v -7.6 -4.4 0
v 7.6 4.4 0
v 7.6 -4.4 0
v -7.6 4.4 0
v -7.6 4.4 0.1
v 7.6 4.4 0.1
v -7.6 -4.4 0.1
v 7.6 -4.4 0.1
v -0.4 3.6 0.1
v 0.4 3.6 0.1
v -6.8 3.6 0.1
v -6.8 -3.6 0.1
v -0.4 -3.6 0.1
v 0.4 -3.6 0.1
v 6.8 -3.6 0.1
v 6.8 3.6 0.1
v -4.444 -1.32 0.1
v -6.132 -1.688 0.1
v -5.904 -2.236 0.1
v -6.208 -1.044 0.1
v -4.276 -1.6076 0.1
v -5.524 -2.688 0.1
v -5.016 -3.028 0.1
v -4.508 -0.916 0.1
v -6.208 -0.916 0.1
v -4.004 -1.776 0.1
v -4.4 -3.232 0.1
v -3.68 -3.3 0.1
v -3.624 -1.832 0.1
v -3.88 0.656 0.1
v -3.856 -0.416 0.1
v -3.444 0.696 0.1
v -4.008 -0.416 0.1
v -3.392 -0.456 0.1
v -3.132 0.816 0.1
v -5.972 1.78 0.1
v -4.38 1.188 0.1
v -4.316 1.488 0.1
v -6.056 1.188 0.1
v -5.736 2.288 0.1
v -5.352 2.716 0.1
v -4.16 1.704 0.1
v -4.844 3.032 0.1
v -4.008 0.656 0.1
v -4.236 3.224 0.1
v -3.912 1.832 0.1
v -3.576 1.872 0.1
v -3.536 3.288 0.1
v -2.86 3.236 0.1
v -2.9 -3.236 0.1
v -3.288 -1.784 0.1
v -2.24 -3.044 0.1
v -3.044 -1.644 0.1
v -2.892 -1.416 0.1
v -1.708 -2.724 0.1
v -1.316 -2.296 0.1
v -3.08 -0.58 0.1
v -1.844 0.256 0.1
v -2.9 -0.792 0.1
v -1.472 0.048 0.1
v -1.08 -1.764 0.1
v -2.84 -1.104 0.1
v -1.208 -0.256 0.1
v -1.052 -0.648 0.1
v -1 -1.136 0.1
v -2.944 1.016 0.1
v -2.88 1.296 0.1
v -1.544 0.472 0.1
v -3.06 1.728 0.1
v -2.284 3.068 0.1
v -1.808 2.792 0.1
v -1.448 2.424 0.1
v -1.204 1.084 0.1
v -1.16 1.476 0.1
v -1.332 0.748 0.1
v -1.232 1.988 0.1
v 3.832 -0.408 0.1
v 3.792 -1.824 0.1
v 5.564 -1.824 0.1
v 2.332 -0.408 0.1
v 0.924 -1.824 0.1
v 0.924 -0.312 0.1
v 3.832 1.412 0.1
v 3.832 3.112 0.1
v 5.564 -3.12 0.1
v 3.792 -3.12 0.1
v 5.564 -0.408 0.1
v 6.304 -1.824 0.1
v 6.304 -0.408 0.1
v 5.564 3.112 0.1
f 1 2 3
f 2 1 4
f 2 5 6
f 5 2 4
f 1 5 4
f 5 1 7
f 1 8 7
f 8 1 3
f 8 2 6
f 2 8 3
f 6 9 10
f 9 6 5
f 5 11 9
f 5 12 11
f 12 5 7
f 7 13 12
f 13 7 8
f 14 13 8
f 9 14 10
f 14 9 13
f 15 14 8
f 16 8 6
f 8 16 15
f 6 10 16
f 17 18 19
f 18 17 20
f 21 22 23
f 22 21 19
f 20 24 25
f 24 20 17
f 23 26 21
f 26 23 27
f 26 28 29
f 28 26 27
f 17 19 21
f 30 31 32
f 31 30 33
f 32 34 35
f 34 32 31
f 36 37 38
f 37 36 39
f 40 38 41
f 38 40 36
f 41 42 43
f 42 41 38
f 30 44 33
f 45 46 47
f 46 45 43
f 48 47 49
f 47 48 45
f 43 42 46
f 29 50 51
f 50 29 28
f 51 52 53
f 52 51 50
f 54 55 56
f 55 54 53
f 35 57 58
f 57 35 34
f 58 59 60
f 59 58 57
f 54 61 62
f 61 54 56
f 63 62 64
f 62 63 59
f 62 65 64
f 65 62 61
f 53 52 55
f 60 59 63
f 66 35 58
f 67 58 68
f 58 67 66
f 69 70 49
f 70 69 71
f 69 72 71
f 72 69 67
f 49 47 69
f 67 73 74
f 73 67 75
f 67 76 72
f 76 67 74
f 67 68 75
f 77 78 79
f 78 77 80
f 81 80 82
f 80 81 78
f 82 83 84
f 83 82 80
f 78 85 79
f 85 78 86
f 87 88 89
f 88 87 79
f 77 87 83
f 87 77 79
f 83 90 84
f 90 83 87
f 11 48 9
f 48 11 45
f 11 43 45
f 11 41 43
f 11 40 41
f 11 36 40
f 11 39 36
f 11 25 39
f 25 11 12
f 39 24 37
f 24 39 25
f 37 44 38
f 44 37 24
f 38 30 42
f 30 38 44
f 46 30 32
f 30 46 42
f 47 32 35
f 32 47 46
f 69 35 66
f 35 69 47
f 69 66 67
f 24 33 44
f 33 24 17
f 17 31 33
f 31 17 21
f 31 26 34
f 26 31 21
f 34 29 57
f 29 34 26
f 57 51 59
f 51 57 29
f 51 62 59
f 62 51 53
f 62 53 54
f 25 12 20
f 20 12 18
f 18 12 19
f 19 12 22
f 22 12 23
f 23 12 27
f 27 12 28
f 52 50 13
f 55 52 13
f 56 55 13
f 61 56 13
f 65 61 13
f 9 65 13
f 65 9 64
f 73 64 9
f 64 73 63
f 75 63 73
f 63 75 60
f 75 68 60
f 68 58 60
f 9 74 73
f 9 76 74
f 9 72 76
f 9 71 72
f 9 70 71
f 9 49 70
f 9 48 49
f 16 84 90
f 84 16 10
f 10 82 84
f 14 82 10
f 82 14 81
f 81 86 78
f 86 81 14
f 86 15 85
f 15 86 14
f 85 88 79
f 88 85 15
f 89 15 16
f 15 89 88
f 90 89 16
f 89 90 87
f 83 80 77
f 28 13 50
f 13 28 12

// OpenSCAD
// file: ../p/box5-12.scad
use <../lib.scad>
function ldraw_lib__box5_12() = [
// 0 Box with 5 Faces without Any Edges
// 0 Name: box5-12.dat
// 0 Author: Chris Dee [cwdee]
// 0 !LDRAW_ORG Primitive UPDATE 2009-02
// 0 !LICENSE Licensed under CC BY 2.0 and CC BY 4.0 : see CAreadme.txt
// 
// 0 BFC CERTIFY CCW
  [0,"BFC","CERTIFY"],
  [0,"BFC","CCW"],
// 
// 0 !HISTORY 2009-09-03 [PTadmin] Official Update 2009-02
// 
// 
// 4 16 1 1 1 1 1 -1 -1 1 -1 -1 1 1
  [4,16,1,1,1,1,1,-1,-1,1,-1,-1,1,1],
// 4 16 -1 0 1 1 0 1 1 1 1 -1 1 1
  [4,16,-1,0,1,1,0,1,1,1,1,-1,1,1],
// 4 16 -1 0 -1 -1 0 1 -1 1 1 -1 1 -1
  [4,16,-1,0,-1,-1,0,1,-1,1,1,-1,1,-1],
// 4 16 1 0 -1 -1 0 -1 -1 1 -1 1 1 -1
  [4,16,1,0,-1,-1,0,-1,-1,1,-1,1,1,-1],
// 4 16 1 0 1 1 0 -1 1 1 -1 1 1 1
  [4,16,1,0,1,1,0,-1,1,1,-1,1,1,1],
// 0
];
module ldraw_lib__box5_12(step=0, col=false, unit=2/5, alt=false, line=0.2, solid=!$preview)
    makepoly(ldraw_lib__box5_12(), step=step, col=col, unit=unit, alt=alt, line=line, solid=solid);
ldraw_lib__box5_12(line=0.2);
// main file
use <../lib.scad>
use <../p/box5-12.scad>
function ldraw_lib__190155d() = [
// 0 Sticker  1.1 x  1.9 with White "3" and "4" in Black Squares
// 0 Name: 190155d.dat
// 0 Author: Takeshi Takahashi [RainbowDolphin]
// 0 !LDRAW_ORG Part UPDATE 2022-05
// 0 !LICENSE Licensed under CC BY 2.0 and CC BY 4.0 : see CAreadme.txt
// 
// 0 BFC CERTIFY CCW
  [0,"BFC","CERTIFY"],
  [0,"BFC","CCW"],
// 
// 0 !KEYWORDS Service station, Set 6378
// 
// 0 !HISTORY 2022-09-15 [PTadmin] Official Update 2022-05
// 
// 
// 1 16 0 -0.25 0 19 0 0 0 0.25 0 0 0 11 box5-12.dat
  [1,16,0,-0.25,0,19,0,0,0,0.25,0,0,0,11, ldraw_lib__box5_12()],
// 4 15 1 -0.25 9 19 -0.25 11 -19 -0.25 11 -1 -0.25 9
  [4,15,1,-0.25,9,19,-0.25,11,-19,-0.25,11,-1,-0.25,9],
// 3 15 -19 -0.25 11 -17 -0.25 9 -1 -0.25 9
  [3,15,-19,-0.25,11,-17,-0.25,9,-1,-0.25,9],
// 4 15 -17 -0.25 -9 -17 -0.25 9 -19 -0.25 11 -19 -0.25 -11
  [4,15,-17,-0.25,-9,-17,-0.25,9,-19,-0.25,11,-19,-0.25,-11],
// 4 15 -1 -0.25 -9 -17 -0.25 -9 -19 -0.25 -11 19 -0.25 -11
  [4,15,-1,-0.25,-9,-17,-0.25,-9,-19,-0.25,-11,19,-0.25,-11],
// 3 15 1 -0.25 -9 -1 -0.25 -9 19 -0.25 -11
  [3,15,1,-0.25,-9,-1,-0.25,-9,19,-0.25,-11],
// 4 15 -1 -0.25 -9 1 -0.25 -9 1 -0.25 9 -1 -0.25 9
  [4,15,-1,-0.25,-9,1,-0.25,-9,1,-0.25,9,-1,-0.25,9],
// 3 15 17 -0.25 -9 1 -0.25 -9 19 -0.25 -11
  [3,15,17,-0.25,-9,1,-0.25,-9,19,-0.25,-11],
// 4 15 17 -0.25 9 17 -0.25 -9 19 -0.25 -11 19 -0.25 11
  [4,15,17,-0.25,9,17,-0.25,-9,19,-0.25,-11,19,-0.25,11],
// 3 15 19 -0.25 11 1 -0.25 9 17 -0.25 9
  [3,15,19,-0.25,11,1,-0.25,9,17,-0.25,9],
// 4 15 -15.33 -0.25 -4.22 -14.76 -0.25 -5.59 -11.11 -0.25 -3.3 -15.52 -0.25 -2.61
  [4,15,-15.33,-0.25,-4.22,-14.76,-0.25,-5.59,-11.11,-0.25,-3.3,-15.52,-0.25,-2.61],
// 4 15 -10.69 -0.25 -4.019 -14.76 -0.25 -5.59 -13.81 -0.25 -6.72 -12.54 -0.25 -7.57
  [4,15,-10.69,-0.25,-4.019,-14.76,-0.25,-5.59,-13.81,-0.25,-6.72,-12.54,-0.25,-7.57],
// 4 15 -11.27 -0.25 -2.29 -15.52 -0.25 -2.29 -15.52 -0.25 -2.61 -11.11 -0.25 -3.3
  [4,15,-11.27,-0.25,-2.29,-15.52,-0.25,-2.29,-15.52,-0.25,-2.61,-11.11,-0.25,-3.3],
// 4 15 -10.01 -0.25 -4.44 -10.69 -0.25 -4.019 -12.54 -0.25 -7.57 -11 -0.25 -8.08
  [4,15,-10.01,-0.25,-4.44,-10.69,-0.25,-4.019,-12.54,-0.25,-7.57,-11,-0.25,-8.08],
// 4 15 -10.01 -0.25 -4.44 -11 -0.25 -8.08 -9.2 -0.25 -8.25 -9.06 -0.25 -4.58
  [4,15,-10.01,-0.25,-4.44,-11,-0.25,-8.08,-9.2,-0.25,-8.25,-9.06,-0.25,-4.58],
// 3 15 -11.11 -0.25 -3.3 -14.76 -0.25 -5.59 -10.69 -0.25 -4.019
  [3,15,-11.11,-0.25,-3.3,-14.76,-0.25,-5.59,-10.69,-0.25,-4.019],
// 4 15 -9.7 -0.25 1.64 -10.02 -0.25 -1.04 -9.64 -0.25 -1.04 -8.61 -0.25 1.74
  [4,15,-9.7,-0.25,1.64,-10.02,-0.25,-1.04,-9.64,-0.25,-1.04,-8.61,-0.25,1.74],
// 4 15 -8.61 -0.25 1.74 -9.64 -0.25 -1.04 -8.48 -0.25 -1.14 -7.83 -0.25 2.04
  [4,15,-8.61,-0.25,1.74,-9.64,-0.25,-1.04,-8.48,-0.25,-1.14,-7.83,-0.25,2.04],
// 4 15 -14.93 -0.25 4.45 -15.14 -0.25 2.97 -10.95 -0.25 2.97 -10.79 -0.25 3.72
  [4,15,-14.93,-0.25,4.45,-15.14,-0.25,2.97,-10.95,-0.25,2.97,-10.79,-0.25,3.72],
// 4 15 -14.34 -0.25 5.72 -14.93 -0.25 4.45 -10.79 -0.25 3.72 -13.38 -0.25 6.79
  [4,15,-14.34,-0.25,5.72,-14.93,-0.25,4.45,-10.79,-0.25,3.72,-13.38,-0.25,6.79],
// 4 15 -10.4 -0.25 4.26 -12.11 -0.25 7.58 -13.38 -0.25 6.79 -10.79 -0.25 3.72
  [4,15,-10.4,-0.25,4.26,-12.11,-0.25,7.58,-13.38,-0.25,6.79,-10.79,-0.25,3.72],
// 3 15 -9.7 -0.25 1.64 -10.02 -0.25 1.64 -10.02 -0.25 -1.04
  [3,15,-9.7,-0.25,1.64,-10.02,-0.25,1.64,-10.02,-0.25,-1.04],
// 4 15 -9.78 -0.25 4.58 -8.94 -0.25 4.68 -10.59 -0.25 8.06 -12.11 -0.25 7.58
  [4,15,-9.78,-0.25,4.58,-8.94,-0.25,4.68,-10.59,-0.25,8.06,-12.11,-0.25,7.58],
// 4 15 -8.84 -0.25 8.22 -10.59 -0.25 8.06 -8.94 -0.25 4.68 -7.15 -0.25 8.09
  [4,15,-8.84,-0.25,8.22,-10.59,-0.25,8.06,-8.94,-0.25,4.68,-7.15,-0.25,8.09],
// 3 15 -12.11 -0.25 7.58 -10.4 -0.25 4.26 -9.78 -0.25 4.58
  [3,15,-12.11,-0.25,7.58,-10.4,-0.25,4.26,-9.78,-0.25,4.58],
// 4 15 -8.22 -0.25 -4.46 -9.06 -0.25 -4.58 -9.2 -0.25 -8.25 -7.25 -0.25 -8.09
  [4,15,-8.22,-0.25,-4.46,-9.06,-0.25,-4.58,-9.2,-0.25,-8.25,-7.25,-0.25,-8.09],
// 4 15 -5.6 -0.25 -7.61 -7.61 -0.25 -4.11 -8.22 -0.25 -4.46 -7.25 -0.25 -8.09
  [4,15,-5.6,-0.25,-7.61,-7.61,-0.25,-4.11,-8.22,-0.25,-4.46,-7.25,-0.25,-8.09],
// 4 15 -7.23 -0.25 -3.54 -7.61 -0.25 -4.11 -4.27 -0.25 -6.81 -3.29 -0.25 -5.74
  [4,15,-7.23,-0.25,-3.54,-7.61,-0.25,-4.11,-4.27,-0.25,-6.81,-3.29,-0.25,-5.74],
// 4 15 -7.83 -0.25 2.04 -8.48 -0.25 -1.14 -7.7 -0.25 -1.45 -4.61 -0.25 0.64
  [4,15,-7.83,-0.25,2.04,-8.48,-0.25,-1.14,-7.7,-0.25,-1.45,-4.61,-0.25,0.64],
// 4 15 -4.61 -0.25 0.64 -7.7 -0.25 -1.45 -7.25 -0.25 -1.98 -3.68 -0.25 0.12
  [4,15,-4.61,-0.25,0.64,-7.7,-0.25,-1.45,-7.25,-0.25,-1.98,-3.68,-0.25,0.12],
// 4 15 -7.23 -0.25 -3.54 -3.29 -0.25 -5.74 -2.7 -0.25 -4.41 -7.1 -0.25 -2.76
  [4,15,-7.23,-0.25,-3.54,-3.29,-0.25,-5.74,-2.7,-0.25,-4.41,-7.1,-0.25,-2.76],
// 4 15 -3.02 -0.25 -0.64 -7.25 -0.25 -1.98 -7.1 -0.25 -2.76 -2.63 -0.25 -1.62
  [4,15,-3.02,-0.25,-0.64,-7.25,-0.25,-1.98,-7.1,-0.25,-2.76,-2.63,-0.25,-1.62],
// 4 15 -2.5 -0.25 -2.84 -2.63 -0.25 -1.62 -7.1 -0.25 -2.76 -2.7 -0.25 -4.41
  [4,15,-2.5,-0.25,-2.84,-2.63,-0.25,-1.62,-7.1,-0.25,-2.76,-2.7,-0.25,-4.41],
// 3 15 -7.61 -0.25 -4.11 -5.6 -0.25 -7.61 -4.27 -0.25 -6.81
  [3,15,-7.61,-0.25,-4.11,-5.6,-0.25,-7.61,-4.27,-0.25,-6.81],
// 3 15 -3.68 -0.25 0.12 -7.25 -0.25 -1.98 -3.02 -0.25 -0.64
  [3,15,-3.68,-0.25,0.12,-7.25,-0.25,-1.98,-3.02,-0.25,-0.64],
// 3 15 -7.36 -0.25 2.54 -7.83 -0.25 2.04 -4.61 -0.25 0.64
  [3,15,-7.36,-0.25,2.54,-7.83,-0.25,2.04,-4.61,-0.25,0.64],
// 4 15 -7.2 -0.25 3.24 -7.36 -0.25 2.54 -4.61 -0.25 0.64 -3.86 -0.25 1.18
  [4,15,-7.2,-0.25,3.24,-7.36,-0.25,2.54,-4.61,-0.25,0.64,-3.86,-0.25,1.18],
// 4 15 -7.65 -0.25 4.32 -4.52 -0.25 6.98 -5.71 -0.25 7.67 -7.15 -0.25 8.09
  [4,15,-7.65,-0.25,4.32,-4.52,-0.25,6.98,-5.71,-0.25,7.67,-7.15,-0.25,8.09],
// 4 15 -7.65 -0.25 4.32 -7.2 -0.25 3.24 -3.62 -0.25 6.06 -4.52 -0.25 6.98
  [4,15,-7.65,-0.25,4.32,-7.2,-0.25,3.24,-3.62,-0.25,6.06,-4.52,-0.25,6.98],
// 3 15 -7.15 -0.25 8.09 -8.94 -0.25 4.68 -7.65 -0.25 4.32
  [3,15,-7.15,-0.25,8.09,-8.94,-0.25,4.68,-7.65,-0.25,4.32],
// 4 15 -7.2 -0.25 3.24 -3.33 -0.25 1.87 -3.01 -0.25 2.71 -2.9 -0.25 3.69
  [4,15,-7.2,-0.25,3.24,-3.33,-0.25,1.87,-3.01,-0.25,2.71,-2.9,-0.25,3.69],
// 4 15 -3.08 -0.25 4.97 -3.62 -0.25 6.06 -7.2 -0.25 3.24 -2.9 -0.25 3.69
  [4,15,-3.08,-0.25,4.97,-3.62,-0.25,6.06,-7.2,-0.25,3.24,-2.9,-0.25,3.69],
// 3 15 -7.2 -0.25 3.24 -3.86 -0.25 1.18 -3.33 -0.25 1.87
  [3,15,-7.2,-0.25,3.24,-3.86,-0.25,1.18,-3.33,-0.25,1.87],
// 4 15 9.48 -0.25 -4.56 13.91 -0.25 -4.56 9.58 -0.25 -1.02 5.83 -0.25 -1.02
  [4,15,9.48,-0.25,-4.56,13.91,-0.25,-4.56,9.58,-0.25,-1.02,5.83,-0.25,-1.02],
// 4 15 2.31 -0.25 -4.56 9.48 -0.25 -4.56 5.83 -0.25 -1.02 2.31 -0.25 -0.78
  [4,15,2.31,-0.25,-4.56,9.48,-0.25,-4.56,5.83,-0.25,-1.02,2.31,-0.25,-0.78],
// 4 15 9.58 -0.25 3.53 9.58 -0.25 7.78 2.31 -0.25 -0.78 5.83 -0.25 -1.02
  [4,15,9.58,-0.25,3.53,9.58,-0.25,7.78,2.31,-0.25,-0.78,5.83,-0.25,-1.02],
// 4 15 9.48 -0.25 -4.56 9.48 -0.25 -7.8 13.91 -0.25 -7.8 13.91 -0.25 -4.56
  [4,15,9.48,-0.25,-4.56,9.48,-0.25,-7.8,13.91,-0.25,-7.8,13.91,-0.25,-4.56],
// 4 15 13.91 -0.25 -4.56 15.76 -0.25 -4.56 15.76 -0.25 -1.02 13.91 -0.25 -1.02
  [4,15,13.91,-0.25,-4.56,15.76,-0.25,-4.56,15.76,-0.25,-1.02,13.91,-0.25,-1.02],
// 4 15 9.58 -0.25 -1.02 13.91 -0.25 -4.56 13.91 -0.25 -1.02 9.58 -0.25 3.53
  [4,15,9.58,-0.25,-1.02,13.91,-0.25,-4.56,13.91,-0.25,-1.02,9.58,-0.25,3.53],
// 4 15 9.58 -0.25 3.53 13.91 -0.25 -1.02 13.91 -0.25 7.78 9.58 -0.25 7.78
  [4,15,9.58,-0.25,3.53,13.91,-0.25,-1.02,13.91,-0.25,7.78,9.58,-0.25,7.78],
// 4 0 -8.84 -0.25 8.22 -1 -0.25 9 -17 -0.25 9 -10.59 -0.25 8.06
  [4,0,-8.84,-0.25,8.22,-1,-0.25,9,-17,-0.25,9,-10.59,-0.25,8.06],
// 3 0 -17 -0.25 9 -12.11 -0.25 7.58 -10.59 -0.25 8.06
  [3,0,-17,-0.25,9,-12.11,-0.25,7.58,-10.59,-0.25,8.06],
// 3 0 -17 -0.25 9 -13.38 -0.25 6.79 -12.11 -0.25 7.58
  [3,0,-17,-0.25,9,-13.38,-0.25,6.79,-12.11,-0.25,7.58],
// 3 0 -17 -0.25 9 -14.34 -0.25 5.72 -13.38 -0.25 6.79
  [3,0,-17,-0.25,9,-14.34,-0.25,5.72,-13.38,-0.25,6.79],
// 3 0 -17 -0.25 9 -14.93 -0.25 4.45 -14.34 -0.25 5.72
  [3,0,-17,-0.25,9,-14.93,-0.25,4.45,-14.34,-0.25,5.72],
// 3 0 -17 -0.25 9 -15.14 -0.25 2.97 -14.93 -0.25 4.45
  [3,0,-17,-0.25,9,-15.14,-0.25,2.97,-14.93,-0.25,4.45],
// 4 0 -15.52 -0.25 -2.29 -15.14 -0.25 2.97 -17 -0.25 9 -17 -0.25 -9
  [4,0,-15.52,-0.25,-2.29,-15.14,-0.25,2.97,-17,-0.25,9,-17,-0.25,-9],
// 4 0 -15.14 -0.25 2.97 -15.52 -0.25 -2.29 -11.27 -0.25 -2.29 -10.95 -0.25 2.97
  [4,0,-15.14,-0.25,2.97,-15.52,-0.25,-2.29,-11.27,-0.25,-2.29,-10.95,-0.25,2.97],
// 4 0 -10.95 -0.25 2.97 -11.27 -0.25 -2.29 -10.02 -0.25 1.64 -10.79 -0.25 3.72
  [4,0,-10.95,-0.25,2.97,-11.27,-0.25,-2.29,-10.02,-0.25,1.64,-10.79,-0.25,3.72],
// 4 0 -10.79 -0.25 3.72 -10.02 -0.25 1.64 -9.7 -0.25 1.64 -10.4 -0.25 4.26
  [4,0,-10.79,-0.25,3.72,-10.02,-0.25,1.64,-9.7,-0.25,1.64,-10.4,-0.25,4.26],
// 4 0 -10.4 -0.25 4.26 -9.7 -0.25 1.64 -8.61 -0.25 1.74 -9.78 -0.25 4.58
  [4,0,-10.4,-0.25,4.26,-9.7,-0.25,1.64,-8.61,-0.25,1.74,-9.78,-0.25,4.58],
// 4 0 -9.78 -0.25 4.58 -8.61 -0.25 1.74 -7.83 -0.25 2.04 -8.94 -0.25 4.68
  [4,0,-9.78,-0.25,4.58,-8.61,-0.25,1.74,-7.83,-0.25,2.04,-8.94,-0.25,4.68],
// 4 0 -8.94 -0.25 4.68 -7.83 -0.25 2.04 -7.36 -0.25 2.54 -7.65 -0.25 4.32
  [4,0,-8.94,-0.25,4.68,-7.83,-0.25,2.04,-7.36,-0.25,2.54,-7.65,-0.25,4.32],
// 3 0 -7.65 -0.25 4.32 -7.36 -0.25 2.54 -7.2 -0.25 3.24
  [3,0,-7.65,-0.25,4.32,-7.36,-0.25,2.54,-7.2,-0.25,3.24],
// 4 0 -10.02 -0.25 -1.04 -10.02 -0.25 1.64 -11.27 -0.25 -2.29 -11.11 -0.25 -3.3
  [4,0,-10.02,-0.25,-1.04,-10.02,-0.25,1.64,-11.27,-0.25,-2.29,-11.11,-0.25,-3.3],
// 4 0 -9.64 -0.25 -1.04 -10.02 -0.25 -1.04 -11.11 -0.25 -3.3 -10.69 -0.25 -4.019
  [4,0,-9.64,-0.25,-1.04,-10.02,-0.25,-1.04,-11.11,-0.25,-3.3,-10.69,-0.25,-4.019],
// 4 0 -8.48 -0.25 -1.14 -9.64 -0.25 -1.04 -10.69 -0.25 -4.019 -10.01 -0.25 -4.44
  [4,0,-8.48,-0.25,-1.14,-9.64,-0.25,-1.04,-10.69,-0.25,-4.019,-10.01,-0.25,-4.44],
// 4 0 -7.7 -0.25 -1.45 -8.48 -0.25 -1.14 -10.01 -0.25 -4.44 -9.06 -0.25 -4.58
  [4,0,-7.7,-0.25,-1.45,-8.48,-0.25,-1.14,-10.01,-0.25,-4.44,-9.06,-0.25,-4.58],
// 4 0 -7.25 -0.25 -1.98 -7.7 -0.25 -1.45 -9.06 -0.25 -4.58 -8.22 -0.25 -4.46
  [4,0,-7.25,-0.25,-1.98,-7.7,-0.25,-1.45,-9.06,-0.25,-4.58,-8.22,-0.25,-4.46],
// 4 0 -7.1 -0.25 -2.76 -7.25 -0.25 -1.98 -8.22 -0.25 -4.46 -7.61 -0.25 -4.11
  [4,0,-7.1,-0.25,-2.76,-7.25,-0.25,-1.98,-8.22,-0.25,-4.46,-7.61,-0.25,-4.11],
// 3 0 -7.1 -0.25 -2.76 -7.61 -0.25 -4.11 -7.23 -0.25 -3.54
  [3,0,-7.1,-0.25,-2.76,-7.61,-0.25,-4.11,-7.23,-0.25,-3.54],
// 3 0 -15.52 -0.25 -2.29 -17 -0.25 -9 -15.52 -0.25 -2.61
  [3,0,-15.52,-0.25,-2.29,-17,-0.25,-9,-15.52,-0.25,-2.61],
// 3 0 -15.52 -0.25 -2.61 -17 -0.25 -9 -15.33 -0.25 -4.22
  [3,0,-15.52,-0.25,-2.61,-17,-0.25,-9,-15.33,-0.25,-4.22],
// 3 0 -15.33 -0.25 -4.22 -17 -0.25 -9 -14.76 -0.25 -5.59
  [3,0,-15.33,-0.25,-4.22,-17,-0.25,-9,-14.76,-0.25,-5.59],
// 3 0 -14.76 -0.25 -5.59 -17 -0.25 -9 -13.81 -0.25 -6.72
  [3,0,-14.76,-0.25,-5.59,-17,-0.25,-9,-13.81,-0.25,-6.72],
// 3 0 -13.81 -0.25 -6.72 -17 -0.25 -9 -12.54 -0.25 -7.57
  [3,0,-13.81,-0.25,-6.72,-17,-0.25,-9,-12.54,-0.25,-7.57],
// 3 0 -12.54 -0.25 -7.57 -17 -0.25 -9 -11 -0.25 -8.08
  [3,0,-12.54,-0.25,-7.57,-17,-0.25,-9,-11,-0.25,-8.08],
// 3 0 -11 -0.25 -8.08 -17 -0.25 -9 -9.2 -0.25 -8.25
  [3,0,-11,-0.25,-8.08,-17,-0.25,-9,-9.2,-0.25,-8.25],
// 3 0 -5.6 -0.25 -7.61 -7.25 -0.25 -8.09 -1 -0.25 -9
  [3,0,-5.6,-0.25,-7.61,-7.25,-0.25,-8.09,-1,-0.25,-9],
// 3 0 -4.27 -0.25 -6.81 -5.6 -0.25 -7.61 -1 -0.25 -9
  [3,0,-4.27,-0.25,-6.81,-5.6,-0.25,-7.61,-1,-0.25,-9],
// 3 0 -3.29 -0.25 -5.74 -4.27 -0.25 -6.81 -1 -0.25 -9
  [3,0,-3.29,-0.25,-5.74,-4.27,-0.25,-6.81,-1,-0.25,-9],
// 3 0 -2.7 -0.25 -4.41 -3.29 -0.25 -5.74 -1 -0.25 -9
  [3,0,-2.7,-0.25,-4.41,-3.29,-0.25,-5.74,-1,-0.25,-9],
// 3 0 -2.5 -0.25 -2.84 -2.7 -0.25 -4.41 -1 -0.25 -9
  [3,0,-2.5,-0.25,-2.84,-2.7,-0.25,-4.41,-1,-0.25,-9],
// 4 0 -2.5 -0.25 -2.84 -1 -0.25 -9 -1 -0.25 9 -2.63 -0.25 -1.62
  [4,0,-2.5,-0.25,-2.84,-1,-0.25,-9,-1,-0.25,9,-2.63,-0.25,-1.62],
// 4 0 -2.63 -0.25 -1.62 -1 -0.25 9 -3.01 -0.25 2.71 -3.02 -0.25 -0.64
  [4,0,-2.63,-0.25,-1.62,-1,-0.25,9,-3.01,-0.25,2.71,-3.02,-0.25,-0.64],
// 4 0 -3.02 -0.25 -0.64 -3.01 -0.25 2.71 -3.33 -0.25 1.87 -3.68 -0.25 0.12
  [4,0,-3.02,-0.25,-0.64,-3.01,-0.25,2.71,-3.33,-0.25,1.87,-3.68,-0.25,0.12],
// 3 0 -3.33 -0.25 1.87 -3.86 -0.25 1.18 -3.68 -0.25 0.12
  [3,0,-3.33,-0.25,1.87,-3.86,-0.25,1.18,-3.68,-0.25,0.12],
// 3 0 -3.86 -0.25 1.18 -4.61 -0.25 0.64 -3.68 -0.25 0.12
  [3,0,-3.86,-0.25,1.18,-4.61,-0.25,0.64,-3.68,-0.25,0.12],
// 3 0 -1 -0.25 9 -2.9 -0.25 3.69 -3.01 -0.25 2.71
  [3,0,-1,-0.25,9,-2.9,-0.25,3.69,-3.01,-0.25,2.71],
// 3 0 -1 -0.25 9 -3.08 -0.25 4.97 -2.9 -0.25 3.69
  [3,0,-1,-0.25,9,-3.08,-0.25,4.97,-2.9,-0.25,3.69],
// 3 0 -1 -0.25 9 -3.62 -0.25 6.06 -3.08 -0.25 4.97
  [3,0,-1,-0.25,9,-3.62,-0.25,6.06,-3.08,-0.25,4.97],
// 3 0 -1 -0.25 9 -4.52 -0.25 6.98 -3.62 -0.25 6.06
  [3,0,-1,-0.25,9,-4.52,-0.25,6.98,-3.62,-0.25,6.06],
// 3 0 -1 -0.25 9 -5.71 -0.25 7.67 -4.52 -0.25 6.98
  [3,0,-1,-0.25,9,-5.71,-0.25,7.67,-4.52,-0.25,6.98],
// 3 0 -1 -0.25 9 -7.15 -0.25 8.09 -5.71 -0.25 7.67
  [3,0,-1,-0.25,9,-7.15,-0.25,8.09,-5.71,-0.25,7.67],
// 3 0 -1 -0.25 9 -8.84 -0.25 8.22 -7.15 -0.25 8.09
  [3,0,-1,-0.25,9,-8.84,-0.25,8.22,-7.15,-0.25,8.09],
// 4 0 17 -0.25 9 1 -0.25 9 9.58 -0.25 7.78 13.91 -0.25 7.78
  [4,0,17,-0.25,9,1,-0.25,9,9.58,-0.25,7.78,13.91,-0.25,7.78],
// 3 0 1 -0.25 9 2.31 -0.25 -0.78 9.58 -0.25 7.78
  [3,0,1,-0.25,9,2.31,-0.25,-0.78,9.58,-0.25,7.78],
// 4 0 2.31 -0.25 -0.78 1 -0.25 9 1 -0.25 -9 2.31 -0.25 -4.56
  [4,0,2.31,-0.25,-0.78,1,-0.25,9,1,-0.25,-9,2.31,-0.25,-4.56],
// 4 0 9.48 -0.25 -4.56 2.31 -0.25 -4.56 1 -0.25 -9 9.48 -0.25 -7.8
  [4,0,9.48,-0.25,-4.56,2.31,-0.25,-4.56,1,-0.25,-9,9.48,-0.25,-7.8],
// 4 0 9.48 -0.25 -7.8 1 -0.25 -9 17 -0.25 -9 13.91 -0.25 -7.8
  [4,0,9.48,-0.25,-7.8,1,-0.25,-9,17,-0.25,-9,13.91,-0.25,-7.8],
// 4 0 13.91 -0.25 -4.56 13.91 -0.25 -7.8 17 -0.25 -9 15.76 -0.25 -4.56
  [4,0,13.91,-0.25,-4.56,13.91,-0.25,-7.8,17,-0.25,-9,15.76,-0.25,-4.56],
// 4 0 15.76 -0.25 -1.02 15.76 -0.25 -4.56 17 -0.25 -9 17 -0.25 9
  [4,0,15.76,-0.25,-1.02,15.76,-0.25,-4.56,17,-0.25,-9,17,-0.25,9],
// 4 0 13.91 -0.25 -1.02 15.76 -0.25 -1.02 17 -0.25 9 13.91 -0.25 7.78
  [4,0,13.91,-0.25,-1.02,15.76,-0.25,-1.02,17,-0.25,9,13.91,-0.25,7.78],
// 3 0 9.58 -0.25 3.53 5.83 -0.25 -1.02 9.58 -0.25 -1.02
  [3,0,9.58,-0.25,3.53,5.83,-0.25,-1.02,9.58,-0.25,-1.02],
// 4 0 -9.2 -0.25 -8.25 -17 -0.25 -9 -1 -0.25 -9 -7.25 -0.25 -8.09
  [4,0,-9.2,-0.25,-8.25,-17,-0.25,-9,-1,-0.25,-9,-7.25,-0.25,-8.09],
];
module ldraw_lib__190155d(step=0, col=false, unit=2/5, alt=false, line=0.2, solid=!$preview)
    makepoly(ldraw_lib__190155d(), step=step, col=col, unit=unit, alt=alt, line=line, solid=solid);
ldraw_lib__190155d(line=0.2);
